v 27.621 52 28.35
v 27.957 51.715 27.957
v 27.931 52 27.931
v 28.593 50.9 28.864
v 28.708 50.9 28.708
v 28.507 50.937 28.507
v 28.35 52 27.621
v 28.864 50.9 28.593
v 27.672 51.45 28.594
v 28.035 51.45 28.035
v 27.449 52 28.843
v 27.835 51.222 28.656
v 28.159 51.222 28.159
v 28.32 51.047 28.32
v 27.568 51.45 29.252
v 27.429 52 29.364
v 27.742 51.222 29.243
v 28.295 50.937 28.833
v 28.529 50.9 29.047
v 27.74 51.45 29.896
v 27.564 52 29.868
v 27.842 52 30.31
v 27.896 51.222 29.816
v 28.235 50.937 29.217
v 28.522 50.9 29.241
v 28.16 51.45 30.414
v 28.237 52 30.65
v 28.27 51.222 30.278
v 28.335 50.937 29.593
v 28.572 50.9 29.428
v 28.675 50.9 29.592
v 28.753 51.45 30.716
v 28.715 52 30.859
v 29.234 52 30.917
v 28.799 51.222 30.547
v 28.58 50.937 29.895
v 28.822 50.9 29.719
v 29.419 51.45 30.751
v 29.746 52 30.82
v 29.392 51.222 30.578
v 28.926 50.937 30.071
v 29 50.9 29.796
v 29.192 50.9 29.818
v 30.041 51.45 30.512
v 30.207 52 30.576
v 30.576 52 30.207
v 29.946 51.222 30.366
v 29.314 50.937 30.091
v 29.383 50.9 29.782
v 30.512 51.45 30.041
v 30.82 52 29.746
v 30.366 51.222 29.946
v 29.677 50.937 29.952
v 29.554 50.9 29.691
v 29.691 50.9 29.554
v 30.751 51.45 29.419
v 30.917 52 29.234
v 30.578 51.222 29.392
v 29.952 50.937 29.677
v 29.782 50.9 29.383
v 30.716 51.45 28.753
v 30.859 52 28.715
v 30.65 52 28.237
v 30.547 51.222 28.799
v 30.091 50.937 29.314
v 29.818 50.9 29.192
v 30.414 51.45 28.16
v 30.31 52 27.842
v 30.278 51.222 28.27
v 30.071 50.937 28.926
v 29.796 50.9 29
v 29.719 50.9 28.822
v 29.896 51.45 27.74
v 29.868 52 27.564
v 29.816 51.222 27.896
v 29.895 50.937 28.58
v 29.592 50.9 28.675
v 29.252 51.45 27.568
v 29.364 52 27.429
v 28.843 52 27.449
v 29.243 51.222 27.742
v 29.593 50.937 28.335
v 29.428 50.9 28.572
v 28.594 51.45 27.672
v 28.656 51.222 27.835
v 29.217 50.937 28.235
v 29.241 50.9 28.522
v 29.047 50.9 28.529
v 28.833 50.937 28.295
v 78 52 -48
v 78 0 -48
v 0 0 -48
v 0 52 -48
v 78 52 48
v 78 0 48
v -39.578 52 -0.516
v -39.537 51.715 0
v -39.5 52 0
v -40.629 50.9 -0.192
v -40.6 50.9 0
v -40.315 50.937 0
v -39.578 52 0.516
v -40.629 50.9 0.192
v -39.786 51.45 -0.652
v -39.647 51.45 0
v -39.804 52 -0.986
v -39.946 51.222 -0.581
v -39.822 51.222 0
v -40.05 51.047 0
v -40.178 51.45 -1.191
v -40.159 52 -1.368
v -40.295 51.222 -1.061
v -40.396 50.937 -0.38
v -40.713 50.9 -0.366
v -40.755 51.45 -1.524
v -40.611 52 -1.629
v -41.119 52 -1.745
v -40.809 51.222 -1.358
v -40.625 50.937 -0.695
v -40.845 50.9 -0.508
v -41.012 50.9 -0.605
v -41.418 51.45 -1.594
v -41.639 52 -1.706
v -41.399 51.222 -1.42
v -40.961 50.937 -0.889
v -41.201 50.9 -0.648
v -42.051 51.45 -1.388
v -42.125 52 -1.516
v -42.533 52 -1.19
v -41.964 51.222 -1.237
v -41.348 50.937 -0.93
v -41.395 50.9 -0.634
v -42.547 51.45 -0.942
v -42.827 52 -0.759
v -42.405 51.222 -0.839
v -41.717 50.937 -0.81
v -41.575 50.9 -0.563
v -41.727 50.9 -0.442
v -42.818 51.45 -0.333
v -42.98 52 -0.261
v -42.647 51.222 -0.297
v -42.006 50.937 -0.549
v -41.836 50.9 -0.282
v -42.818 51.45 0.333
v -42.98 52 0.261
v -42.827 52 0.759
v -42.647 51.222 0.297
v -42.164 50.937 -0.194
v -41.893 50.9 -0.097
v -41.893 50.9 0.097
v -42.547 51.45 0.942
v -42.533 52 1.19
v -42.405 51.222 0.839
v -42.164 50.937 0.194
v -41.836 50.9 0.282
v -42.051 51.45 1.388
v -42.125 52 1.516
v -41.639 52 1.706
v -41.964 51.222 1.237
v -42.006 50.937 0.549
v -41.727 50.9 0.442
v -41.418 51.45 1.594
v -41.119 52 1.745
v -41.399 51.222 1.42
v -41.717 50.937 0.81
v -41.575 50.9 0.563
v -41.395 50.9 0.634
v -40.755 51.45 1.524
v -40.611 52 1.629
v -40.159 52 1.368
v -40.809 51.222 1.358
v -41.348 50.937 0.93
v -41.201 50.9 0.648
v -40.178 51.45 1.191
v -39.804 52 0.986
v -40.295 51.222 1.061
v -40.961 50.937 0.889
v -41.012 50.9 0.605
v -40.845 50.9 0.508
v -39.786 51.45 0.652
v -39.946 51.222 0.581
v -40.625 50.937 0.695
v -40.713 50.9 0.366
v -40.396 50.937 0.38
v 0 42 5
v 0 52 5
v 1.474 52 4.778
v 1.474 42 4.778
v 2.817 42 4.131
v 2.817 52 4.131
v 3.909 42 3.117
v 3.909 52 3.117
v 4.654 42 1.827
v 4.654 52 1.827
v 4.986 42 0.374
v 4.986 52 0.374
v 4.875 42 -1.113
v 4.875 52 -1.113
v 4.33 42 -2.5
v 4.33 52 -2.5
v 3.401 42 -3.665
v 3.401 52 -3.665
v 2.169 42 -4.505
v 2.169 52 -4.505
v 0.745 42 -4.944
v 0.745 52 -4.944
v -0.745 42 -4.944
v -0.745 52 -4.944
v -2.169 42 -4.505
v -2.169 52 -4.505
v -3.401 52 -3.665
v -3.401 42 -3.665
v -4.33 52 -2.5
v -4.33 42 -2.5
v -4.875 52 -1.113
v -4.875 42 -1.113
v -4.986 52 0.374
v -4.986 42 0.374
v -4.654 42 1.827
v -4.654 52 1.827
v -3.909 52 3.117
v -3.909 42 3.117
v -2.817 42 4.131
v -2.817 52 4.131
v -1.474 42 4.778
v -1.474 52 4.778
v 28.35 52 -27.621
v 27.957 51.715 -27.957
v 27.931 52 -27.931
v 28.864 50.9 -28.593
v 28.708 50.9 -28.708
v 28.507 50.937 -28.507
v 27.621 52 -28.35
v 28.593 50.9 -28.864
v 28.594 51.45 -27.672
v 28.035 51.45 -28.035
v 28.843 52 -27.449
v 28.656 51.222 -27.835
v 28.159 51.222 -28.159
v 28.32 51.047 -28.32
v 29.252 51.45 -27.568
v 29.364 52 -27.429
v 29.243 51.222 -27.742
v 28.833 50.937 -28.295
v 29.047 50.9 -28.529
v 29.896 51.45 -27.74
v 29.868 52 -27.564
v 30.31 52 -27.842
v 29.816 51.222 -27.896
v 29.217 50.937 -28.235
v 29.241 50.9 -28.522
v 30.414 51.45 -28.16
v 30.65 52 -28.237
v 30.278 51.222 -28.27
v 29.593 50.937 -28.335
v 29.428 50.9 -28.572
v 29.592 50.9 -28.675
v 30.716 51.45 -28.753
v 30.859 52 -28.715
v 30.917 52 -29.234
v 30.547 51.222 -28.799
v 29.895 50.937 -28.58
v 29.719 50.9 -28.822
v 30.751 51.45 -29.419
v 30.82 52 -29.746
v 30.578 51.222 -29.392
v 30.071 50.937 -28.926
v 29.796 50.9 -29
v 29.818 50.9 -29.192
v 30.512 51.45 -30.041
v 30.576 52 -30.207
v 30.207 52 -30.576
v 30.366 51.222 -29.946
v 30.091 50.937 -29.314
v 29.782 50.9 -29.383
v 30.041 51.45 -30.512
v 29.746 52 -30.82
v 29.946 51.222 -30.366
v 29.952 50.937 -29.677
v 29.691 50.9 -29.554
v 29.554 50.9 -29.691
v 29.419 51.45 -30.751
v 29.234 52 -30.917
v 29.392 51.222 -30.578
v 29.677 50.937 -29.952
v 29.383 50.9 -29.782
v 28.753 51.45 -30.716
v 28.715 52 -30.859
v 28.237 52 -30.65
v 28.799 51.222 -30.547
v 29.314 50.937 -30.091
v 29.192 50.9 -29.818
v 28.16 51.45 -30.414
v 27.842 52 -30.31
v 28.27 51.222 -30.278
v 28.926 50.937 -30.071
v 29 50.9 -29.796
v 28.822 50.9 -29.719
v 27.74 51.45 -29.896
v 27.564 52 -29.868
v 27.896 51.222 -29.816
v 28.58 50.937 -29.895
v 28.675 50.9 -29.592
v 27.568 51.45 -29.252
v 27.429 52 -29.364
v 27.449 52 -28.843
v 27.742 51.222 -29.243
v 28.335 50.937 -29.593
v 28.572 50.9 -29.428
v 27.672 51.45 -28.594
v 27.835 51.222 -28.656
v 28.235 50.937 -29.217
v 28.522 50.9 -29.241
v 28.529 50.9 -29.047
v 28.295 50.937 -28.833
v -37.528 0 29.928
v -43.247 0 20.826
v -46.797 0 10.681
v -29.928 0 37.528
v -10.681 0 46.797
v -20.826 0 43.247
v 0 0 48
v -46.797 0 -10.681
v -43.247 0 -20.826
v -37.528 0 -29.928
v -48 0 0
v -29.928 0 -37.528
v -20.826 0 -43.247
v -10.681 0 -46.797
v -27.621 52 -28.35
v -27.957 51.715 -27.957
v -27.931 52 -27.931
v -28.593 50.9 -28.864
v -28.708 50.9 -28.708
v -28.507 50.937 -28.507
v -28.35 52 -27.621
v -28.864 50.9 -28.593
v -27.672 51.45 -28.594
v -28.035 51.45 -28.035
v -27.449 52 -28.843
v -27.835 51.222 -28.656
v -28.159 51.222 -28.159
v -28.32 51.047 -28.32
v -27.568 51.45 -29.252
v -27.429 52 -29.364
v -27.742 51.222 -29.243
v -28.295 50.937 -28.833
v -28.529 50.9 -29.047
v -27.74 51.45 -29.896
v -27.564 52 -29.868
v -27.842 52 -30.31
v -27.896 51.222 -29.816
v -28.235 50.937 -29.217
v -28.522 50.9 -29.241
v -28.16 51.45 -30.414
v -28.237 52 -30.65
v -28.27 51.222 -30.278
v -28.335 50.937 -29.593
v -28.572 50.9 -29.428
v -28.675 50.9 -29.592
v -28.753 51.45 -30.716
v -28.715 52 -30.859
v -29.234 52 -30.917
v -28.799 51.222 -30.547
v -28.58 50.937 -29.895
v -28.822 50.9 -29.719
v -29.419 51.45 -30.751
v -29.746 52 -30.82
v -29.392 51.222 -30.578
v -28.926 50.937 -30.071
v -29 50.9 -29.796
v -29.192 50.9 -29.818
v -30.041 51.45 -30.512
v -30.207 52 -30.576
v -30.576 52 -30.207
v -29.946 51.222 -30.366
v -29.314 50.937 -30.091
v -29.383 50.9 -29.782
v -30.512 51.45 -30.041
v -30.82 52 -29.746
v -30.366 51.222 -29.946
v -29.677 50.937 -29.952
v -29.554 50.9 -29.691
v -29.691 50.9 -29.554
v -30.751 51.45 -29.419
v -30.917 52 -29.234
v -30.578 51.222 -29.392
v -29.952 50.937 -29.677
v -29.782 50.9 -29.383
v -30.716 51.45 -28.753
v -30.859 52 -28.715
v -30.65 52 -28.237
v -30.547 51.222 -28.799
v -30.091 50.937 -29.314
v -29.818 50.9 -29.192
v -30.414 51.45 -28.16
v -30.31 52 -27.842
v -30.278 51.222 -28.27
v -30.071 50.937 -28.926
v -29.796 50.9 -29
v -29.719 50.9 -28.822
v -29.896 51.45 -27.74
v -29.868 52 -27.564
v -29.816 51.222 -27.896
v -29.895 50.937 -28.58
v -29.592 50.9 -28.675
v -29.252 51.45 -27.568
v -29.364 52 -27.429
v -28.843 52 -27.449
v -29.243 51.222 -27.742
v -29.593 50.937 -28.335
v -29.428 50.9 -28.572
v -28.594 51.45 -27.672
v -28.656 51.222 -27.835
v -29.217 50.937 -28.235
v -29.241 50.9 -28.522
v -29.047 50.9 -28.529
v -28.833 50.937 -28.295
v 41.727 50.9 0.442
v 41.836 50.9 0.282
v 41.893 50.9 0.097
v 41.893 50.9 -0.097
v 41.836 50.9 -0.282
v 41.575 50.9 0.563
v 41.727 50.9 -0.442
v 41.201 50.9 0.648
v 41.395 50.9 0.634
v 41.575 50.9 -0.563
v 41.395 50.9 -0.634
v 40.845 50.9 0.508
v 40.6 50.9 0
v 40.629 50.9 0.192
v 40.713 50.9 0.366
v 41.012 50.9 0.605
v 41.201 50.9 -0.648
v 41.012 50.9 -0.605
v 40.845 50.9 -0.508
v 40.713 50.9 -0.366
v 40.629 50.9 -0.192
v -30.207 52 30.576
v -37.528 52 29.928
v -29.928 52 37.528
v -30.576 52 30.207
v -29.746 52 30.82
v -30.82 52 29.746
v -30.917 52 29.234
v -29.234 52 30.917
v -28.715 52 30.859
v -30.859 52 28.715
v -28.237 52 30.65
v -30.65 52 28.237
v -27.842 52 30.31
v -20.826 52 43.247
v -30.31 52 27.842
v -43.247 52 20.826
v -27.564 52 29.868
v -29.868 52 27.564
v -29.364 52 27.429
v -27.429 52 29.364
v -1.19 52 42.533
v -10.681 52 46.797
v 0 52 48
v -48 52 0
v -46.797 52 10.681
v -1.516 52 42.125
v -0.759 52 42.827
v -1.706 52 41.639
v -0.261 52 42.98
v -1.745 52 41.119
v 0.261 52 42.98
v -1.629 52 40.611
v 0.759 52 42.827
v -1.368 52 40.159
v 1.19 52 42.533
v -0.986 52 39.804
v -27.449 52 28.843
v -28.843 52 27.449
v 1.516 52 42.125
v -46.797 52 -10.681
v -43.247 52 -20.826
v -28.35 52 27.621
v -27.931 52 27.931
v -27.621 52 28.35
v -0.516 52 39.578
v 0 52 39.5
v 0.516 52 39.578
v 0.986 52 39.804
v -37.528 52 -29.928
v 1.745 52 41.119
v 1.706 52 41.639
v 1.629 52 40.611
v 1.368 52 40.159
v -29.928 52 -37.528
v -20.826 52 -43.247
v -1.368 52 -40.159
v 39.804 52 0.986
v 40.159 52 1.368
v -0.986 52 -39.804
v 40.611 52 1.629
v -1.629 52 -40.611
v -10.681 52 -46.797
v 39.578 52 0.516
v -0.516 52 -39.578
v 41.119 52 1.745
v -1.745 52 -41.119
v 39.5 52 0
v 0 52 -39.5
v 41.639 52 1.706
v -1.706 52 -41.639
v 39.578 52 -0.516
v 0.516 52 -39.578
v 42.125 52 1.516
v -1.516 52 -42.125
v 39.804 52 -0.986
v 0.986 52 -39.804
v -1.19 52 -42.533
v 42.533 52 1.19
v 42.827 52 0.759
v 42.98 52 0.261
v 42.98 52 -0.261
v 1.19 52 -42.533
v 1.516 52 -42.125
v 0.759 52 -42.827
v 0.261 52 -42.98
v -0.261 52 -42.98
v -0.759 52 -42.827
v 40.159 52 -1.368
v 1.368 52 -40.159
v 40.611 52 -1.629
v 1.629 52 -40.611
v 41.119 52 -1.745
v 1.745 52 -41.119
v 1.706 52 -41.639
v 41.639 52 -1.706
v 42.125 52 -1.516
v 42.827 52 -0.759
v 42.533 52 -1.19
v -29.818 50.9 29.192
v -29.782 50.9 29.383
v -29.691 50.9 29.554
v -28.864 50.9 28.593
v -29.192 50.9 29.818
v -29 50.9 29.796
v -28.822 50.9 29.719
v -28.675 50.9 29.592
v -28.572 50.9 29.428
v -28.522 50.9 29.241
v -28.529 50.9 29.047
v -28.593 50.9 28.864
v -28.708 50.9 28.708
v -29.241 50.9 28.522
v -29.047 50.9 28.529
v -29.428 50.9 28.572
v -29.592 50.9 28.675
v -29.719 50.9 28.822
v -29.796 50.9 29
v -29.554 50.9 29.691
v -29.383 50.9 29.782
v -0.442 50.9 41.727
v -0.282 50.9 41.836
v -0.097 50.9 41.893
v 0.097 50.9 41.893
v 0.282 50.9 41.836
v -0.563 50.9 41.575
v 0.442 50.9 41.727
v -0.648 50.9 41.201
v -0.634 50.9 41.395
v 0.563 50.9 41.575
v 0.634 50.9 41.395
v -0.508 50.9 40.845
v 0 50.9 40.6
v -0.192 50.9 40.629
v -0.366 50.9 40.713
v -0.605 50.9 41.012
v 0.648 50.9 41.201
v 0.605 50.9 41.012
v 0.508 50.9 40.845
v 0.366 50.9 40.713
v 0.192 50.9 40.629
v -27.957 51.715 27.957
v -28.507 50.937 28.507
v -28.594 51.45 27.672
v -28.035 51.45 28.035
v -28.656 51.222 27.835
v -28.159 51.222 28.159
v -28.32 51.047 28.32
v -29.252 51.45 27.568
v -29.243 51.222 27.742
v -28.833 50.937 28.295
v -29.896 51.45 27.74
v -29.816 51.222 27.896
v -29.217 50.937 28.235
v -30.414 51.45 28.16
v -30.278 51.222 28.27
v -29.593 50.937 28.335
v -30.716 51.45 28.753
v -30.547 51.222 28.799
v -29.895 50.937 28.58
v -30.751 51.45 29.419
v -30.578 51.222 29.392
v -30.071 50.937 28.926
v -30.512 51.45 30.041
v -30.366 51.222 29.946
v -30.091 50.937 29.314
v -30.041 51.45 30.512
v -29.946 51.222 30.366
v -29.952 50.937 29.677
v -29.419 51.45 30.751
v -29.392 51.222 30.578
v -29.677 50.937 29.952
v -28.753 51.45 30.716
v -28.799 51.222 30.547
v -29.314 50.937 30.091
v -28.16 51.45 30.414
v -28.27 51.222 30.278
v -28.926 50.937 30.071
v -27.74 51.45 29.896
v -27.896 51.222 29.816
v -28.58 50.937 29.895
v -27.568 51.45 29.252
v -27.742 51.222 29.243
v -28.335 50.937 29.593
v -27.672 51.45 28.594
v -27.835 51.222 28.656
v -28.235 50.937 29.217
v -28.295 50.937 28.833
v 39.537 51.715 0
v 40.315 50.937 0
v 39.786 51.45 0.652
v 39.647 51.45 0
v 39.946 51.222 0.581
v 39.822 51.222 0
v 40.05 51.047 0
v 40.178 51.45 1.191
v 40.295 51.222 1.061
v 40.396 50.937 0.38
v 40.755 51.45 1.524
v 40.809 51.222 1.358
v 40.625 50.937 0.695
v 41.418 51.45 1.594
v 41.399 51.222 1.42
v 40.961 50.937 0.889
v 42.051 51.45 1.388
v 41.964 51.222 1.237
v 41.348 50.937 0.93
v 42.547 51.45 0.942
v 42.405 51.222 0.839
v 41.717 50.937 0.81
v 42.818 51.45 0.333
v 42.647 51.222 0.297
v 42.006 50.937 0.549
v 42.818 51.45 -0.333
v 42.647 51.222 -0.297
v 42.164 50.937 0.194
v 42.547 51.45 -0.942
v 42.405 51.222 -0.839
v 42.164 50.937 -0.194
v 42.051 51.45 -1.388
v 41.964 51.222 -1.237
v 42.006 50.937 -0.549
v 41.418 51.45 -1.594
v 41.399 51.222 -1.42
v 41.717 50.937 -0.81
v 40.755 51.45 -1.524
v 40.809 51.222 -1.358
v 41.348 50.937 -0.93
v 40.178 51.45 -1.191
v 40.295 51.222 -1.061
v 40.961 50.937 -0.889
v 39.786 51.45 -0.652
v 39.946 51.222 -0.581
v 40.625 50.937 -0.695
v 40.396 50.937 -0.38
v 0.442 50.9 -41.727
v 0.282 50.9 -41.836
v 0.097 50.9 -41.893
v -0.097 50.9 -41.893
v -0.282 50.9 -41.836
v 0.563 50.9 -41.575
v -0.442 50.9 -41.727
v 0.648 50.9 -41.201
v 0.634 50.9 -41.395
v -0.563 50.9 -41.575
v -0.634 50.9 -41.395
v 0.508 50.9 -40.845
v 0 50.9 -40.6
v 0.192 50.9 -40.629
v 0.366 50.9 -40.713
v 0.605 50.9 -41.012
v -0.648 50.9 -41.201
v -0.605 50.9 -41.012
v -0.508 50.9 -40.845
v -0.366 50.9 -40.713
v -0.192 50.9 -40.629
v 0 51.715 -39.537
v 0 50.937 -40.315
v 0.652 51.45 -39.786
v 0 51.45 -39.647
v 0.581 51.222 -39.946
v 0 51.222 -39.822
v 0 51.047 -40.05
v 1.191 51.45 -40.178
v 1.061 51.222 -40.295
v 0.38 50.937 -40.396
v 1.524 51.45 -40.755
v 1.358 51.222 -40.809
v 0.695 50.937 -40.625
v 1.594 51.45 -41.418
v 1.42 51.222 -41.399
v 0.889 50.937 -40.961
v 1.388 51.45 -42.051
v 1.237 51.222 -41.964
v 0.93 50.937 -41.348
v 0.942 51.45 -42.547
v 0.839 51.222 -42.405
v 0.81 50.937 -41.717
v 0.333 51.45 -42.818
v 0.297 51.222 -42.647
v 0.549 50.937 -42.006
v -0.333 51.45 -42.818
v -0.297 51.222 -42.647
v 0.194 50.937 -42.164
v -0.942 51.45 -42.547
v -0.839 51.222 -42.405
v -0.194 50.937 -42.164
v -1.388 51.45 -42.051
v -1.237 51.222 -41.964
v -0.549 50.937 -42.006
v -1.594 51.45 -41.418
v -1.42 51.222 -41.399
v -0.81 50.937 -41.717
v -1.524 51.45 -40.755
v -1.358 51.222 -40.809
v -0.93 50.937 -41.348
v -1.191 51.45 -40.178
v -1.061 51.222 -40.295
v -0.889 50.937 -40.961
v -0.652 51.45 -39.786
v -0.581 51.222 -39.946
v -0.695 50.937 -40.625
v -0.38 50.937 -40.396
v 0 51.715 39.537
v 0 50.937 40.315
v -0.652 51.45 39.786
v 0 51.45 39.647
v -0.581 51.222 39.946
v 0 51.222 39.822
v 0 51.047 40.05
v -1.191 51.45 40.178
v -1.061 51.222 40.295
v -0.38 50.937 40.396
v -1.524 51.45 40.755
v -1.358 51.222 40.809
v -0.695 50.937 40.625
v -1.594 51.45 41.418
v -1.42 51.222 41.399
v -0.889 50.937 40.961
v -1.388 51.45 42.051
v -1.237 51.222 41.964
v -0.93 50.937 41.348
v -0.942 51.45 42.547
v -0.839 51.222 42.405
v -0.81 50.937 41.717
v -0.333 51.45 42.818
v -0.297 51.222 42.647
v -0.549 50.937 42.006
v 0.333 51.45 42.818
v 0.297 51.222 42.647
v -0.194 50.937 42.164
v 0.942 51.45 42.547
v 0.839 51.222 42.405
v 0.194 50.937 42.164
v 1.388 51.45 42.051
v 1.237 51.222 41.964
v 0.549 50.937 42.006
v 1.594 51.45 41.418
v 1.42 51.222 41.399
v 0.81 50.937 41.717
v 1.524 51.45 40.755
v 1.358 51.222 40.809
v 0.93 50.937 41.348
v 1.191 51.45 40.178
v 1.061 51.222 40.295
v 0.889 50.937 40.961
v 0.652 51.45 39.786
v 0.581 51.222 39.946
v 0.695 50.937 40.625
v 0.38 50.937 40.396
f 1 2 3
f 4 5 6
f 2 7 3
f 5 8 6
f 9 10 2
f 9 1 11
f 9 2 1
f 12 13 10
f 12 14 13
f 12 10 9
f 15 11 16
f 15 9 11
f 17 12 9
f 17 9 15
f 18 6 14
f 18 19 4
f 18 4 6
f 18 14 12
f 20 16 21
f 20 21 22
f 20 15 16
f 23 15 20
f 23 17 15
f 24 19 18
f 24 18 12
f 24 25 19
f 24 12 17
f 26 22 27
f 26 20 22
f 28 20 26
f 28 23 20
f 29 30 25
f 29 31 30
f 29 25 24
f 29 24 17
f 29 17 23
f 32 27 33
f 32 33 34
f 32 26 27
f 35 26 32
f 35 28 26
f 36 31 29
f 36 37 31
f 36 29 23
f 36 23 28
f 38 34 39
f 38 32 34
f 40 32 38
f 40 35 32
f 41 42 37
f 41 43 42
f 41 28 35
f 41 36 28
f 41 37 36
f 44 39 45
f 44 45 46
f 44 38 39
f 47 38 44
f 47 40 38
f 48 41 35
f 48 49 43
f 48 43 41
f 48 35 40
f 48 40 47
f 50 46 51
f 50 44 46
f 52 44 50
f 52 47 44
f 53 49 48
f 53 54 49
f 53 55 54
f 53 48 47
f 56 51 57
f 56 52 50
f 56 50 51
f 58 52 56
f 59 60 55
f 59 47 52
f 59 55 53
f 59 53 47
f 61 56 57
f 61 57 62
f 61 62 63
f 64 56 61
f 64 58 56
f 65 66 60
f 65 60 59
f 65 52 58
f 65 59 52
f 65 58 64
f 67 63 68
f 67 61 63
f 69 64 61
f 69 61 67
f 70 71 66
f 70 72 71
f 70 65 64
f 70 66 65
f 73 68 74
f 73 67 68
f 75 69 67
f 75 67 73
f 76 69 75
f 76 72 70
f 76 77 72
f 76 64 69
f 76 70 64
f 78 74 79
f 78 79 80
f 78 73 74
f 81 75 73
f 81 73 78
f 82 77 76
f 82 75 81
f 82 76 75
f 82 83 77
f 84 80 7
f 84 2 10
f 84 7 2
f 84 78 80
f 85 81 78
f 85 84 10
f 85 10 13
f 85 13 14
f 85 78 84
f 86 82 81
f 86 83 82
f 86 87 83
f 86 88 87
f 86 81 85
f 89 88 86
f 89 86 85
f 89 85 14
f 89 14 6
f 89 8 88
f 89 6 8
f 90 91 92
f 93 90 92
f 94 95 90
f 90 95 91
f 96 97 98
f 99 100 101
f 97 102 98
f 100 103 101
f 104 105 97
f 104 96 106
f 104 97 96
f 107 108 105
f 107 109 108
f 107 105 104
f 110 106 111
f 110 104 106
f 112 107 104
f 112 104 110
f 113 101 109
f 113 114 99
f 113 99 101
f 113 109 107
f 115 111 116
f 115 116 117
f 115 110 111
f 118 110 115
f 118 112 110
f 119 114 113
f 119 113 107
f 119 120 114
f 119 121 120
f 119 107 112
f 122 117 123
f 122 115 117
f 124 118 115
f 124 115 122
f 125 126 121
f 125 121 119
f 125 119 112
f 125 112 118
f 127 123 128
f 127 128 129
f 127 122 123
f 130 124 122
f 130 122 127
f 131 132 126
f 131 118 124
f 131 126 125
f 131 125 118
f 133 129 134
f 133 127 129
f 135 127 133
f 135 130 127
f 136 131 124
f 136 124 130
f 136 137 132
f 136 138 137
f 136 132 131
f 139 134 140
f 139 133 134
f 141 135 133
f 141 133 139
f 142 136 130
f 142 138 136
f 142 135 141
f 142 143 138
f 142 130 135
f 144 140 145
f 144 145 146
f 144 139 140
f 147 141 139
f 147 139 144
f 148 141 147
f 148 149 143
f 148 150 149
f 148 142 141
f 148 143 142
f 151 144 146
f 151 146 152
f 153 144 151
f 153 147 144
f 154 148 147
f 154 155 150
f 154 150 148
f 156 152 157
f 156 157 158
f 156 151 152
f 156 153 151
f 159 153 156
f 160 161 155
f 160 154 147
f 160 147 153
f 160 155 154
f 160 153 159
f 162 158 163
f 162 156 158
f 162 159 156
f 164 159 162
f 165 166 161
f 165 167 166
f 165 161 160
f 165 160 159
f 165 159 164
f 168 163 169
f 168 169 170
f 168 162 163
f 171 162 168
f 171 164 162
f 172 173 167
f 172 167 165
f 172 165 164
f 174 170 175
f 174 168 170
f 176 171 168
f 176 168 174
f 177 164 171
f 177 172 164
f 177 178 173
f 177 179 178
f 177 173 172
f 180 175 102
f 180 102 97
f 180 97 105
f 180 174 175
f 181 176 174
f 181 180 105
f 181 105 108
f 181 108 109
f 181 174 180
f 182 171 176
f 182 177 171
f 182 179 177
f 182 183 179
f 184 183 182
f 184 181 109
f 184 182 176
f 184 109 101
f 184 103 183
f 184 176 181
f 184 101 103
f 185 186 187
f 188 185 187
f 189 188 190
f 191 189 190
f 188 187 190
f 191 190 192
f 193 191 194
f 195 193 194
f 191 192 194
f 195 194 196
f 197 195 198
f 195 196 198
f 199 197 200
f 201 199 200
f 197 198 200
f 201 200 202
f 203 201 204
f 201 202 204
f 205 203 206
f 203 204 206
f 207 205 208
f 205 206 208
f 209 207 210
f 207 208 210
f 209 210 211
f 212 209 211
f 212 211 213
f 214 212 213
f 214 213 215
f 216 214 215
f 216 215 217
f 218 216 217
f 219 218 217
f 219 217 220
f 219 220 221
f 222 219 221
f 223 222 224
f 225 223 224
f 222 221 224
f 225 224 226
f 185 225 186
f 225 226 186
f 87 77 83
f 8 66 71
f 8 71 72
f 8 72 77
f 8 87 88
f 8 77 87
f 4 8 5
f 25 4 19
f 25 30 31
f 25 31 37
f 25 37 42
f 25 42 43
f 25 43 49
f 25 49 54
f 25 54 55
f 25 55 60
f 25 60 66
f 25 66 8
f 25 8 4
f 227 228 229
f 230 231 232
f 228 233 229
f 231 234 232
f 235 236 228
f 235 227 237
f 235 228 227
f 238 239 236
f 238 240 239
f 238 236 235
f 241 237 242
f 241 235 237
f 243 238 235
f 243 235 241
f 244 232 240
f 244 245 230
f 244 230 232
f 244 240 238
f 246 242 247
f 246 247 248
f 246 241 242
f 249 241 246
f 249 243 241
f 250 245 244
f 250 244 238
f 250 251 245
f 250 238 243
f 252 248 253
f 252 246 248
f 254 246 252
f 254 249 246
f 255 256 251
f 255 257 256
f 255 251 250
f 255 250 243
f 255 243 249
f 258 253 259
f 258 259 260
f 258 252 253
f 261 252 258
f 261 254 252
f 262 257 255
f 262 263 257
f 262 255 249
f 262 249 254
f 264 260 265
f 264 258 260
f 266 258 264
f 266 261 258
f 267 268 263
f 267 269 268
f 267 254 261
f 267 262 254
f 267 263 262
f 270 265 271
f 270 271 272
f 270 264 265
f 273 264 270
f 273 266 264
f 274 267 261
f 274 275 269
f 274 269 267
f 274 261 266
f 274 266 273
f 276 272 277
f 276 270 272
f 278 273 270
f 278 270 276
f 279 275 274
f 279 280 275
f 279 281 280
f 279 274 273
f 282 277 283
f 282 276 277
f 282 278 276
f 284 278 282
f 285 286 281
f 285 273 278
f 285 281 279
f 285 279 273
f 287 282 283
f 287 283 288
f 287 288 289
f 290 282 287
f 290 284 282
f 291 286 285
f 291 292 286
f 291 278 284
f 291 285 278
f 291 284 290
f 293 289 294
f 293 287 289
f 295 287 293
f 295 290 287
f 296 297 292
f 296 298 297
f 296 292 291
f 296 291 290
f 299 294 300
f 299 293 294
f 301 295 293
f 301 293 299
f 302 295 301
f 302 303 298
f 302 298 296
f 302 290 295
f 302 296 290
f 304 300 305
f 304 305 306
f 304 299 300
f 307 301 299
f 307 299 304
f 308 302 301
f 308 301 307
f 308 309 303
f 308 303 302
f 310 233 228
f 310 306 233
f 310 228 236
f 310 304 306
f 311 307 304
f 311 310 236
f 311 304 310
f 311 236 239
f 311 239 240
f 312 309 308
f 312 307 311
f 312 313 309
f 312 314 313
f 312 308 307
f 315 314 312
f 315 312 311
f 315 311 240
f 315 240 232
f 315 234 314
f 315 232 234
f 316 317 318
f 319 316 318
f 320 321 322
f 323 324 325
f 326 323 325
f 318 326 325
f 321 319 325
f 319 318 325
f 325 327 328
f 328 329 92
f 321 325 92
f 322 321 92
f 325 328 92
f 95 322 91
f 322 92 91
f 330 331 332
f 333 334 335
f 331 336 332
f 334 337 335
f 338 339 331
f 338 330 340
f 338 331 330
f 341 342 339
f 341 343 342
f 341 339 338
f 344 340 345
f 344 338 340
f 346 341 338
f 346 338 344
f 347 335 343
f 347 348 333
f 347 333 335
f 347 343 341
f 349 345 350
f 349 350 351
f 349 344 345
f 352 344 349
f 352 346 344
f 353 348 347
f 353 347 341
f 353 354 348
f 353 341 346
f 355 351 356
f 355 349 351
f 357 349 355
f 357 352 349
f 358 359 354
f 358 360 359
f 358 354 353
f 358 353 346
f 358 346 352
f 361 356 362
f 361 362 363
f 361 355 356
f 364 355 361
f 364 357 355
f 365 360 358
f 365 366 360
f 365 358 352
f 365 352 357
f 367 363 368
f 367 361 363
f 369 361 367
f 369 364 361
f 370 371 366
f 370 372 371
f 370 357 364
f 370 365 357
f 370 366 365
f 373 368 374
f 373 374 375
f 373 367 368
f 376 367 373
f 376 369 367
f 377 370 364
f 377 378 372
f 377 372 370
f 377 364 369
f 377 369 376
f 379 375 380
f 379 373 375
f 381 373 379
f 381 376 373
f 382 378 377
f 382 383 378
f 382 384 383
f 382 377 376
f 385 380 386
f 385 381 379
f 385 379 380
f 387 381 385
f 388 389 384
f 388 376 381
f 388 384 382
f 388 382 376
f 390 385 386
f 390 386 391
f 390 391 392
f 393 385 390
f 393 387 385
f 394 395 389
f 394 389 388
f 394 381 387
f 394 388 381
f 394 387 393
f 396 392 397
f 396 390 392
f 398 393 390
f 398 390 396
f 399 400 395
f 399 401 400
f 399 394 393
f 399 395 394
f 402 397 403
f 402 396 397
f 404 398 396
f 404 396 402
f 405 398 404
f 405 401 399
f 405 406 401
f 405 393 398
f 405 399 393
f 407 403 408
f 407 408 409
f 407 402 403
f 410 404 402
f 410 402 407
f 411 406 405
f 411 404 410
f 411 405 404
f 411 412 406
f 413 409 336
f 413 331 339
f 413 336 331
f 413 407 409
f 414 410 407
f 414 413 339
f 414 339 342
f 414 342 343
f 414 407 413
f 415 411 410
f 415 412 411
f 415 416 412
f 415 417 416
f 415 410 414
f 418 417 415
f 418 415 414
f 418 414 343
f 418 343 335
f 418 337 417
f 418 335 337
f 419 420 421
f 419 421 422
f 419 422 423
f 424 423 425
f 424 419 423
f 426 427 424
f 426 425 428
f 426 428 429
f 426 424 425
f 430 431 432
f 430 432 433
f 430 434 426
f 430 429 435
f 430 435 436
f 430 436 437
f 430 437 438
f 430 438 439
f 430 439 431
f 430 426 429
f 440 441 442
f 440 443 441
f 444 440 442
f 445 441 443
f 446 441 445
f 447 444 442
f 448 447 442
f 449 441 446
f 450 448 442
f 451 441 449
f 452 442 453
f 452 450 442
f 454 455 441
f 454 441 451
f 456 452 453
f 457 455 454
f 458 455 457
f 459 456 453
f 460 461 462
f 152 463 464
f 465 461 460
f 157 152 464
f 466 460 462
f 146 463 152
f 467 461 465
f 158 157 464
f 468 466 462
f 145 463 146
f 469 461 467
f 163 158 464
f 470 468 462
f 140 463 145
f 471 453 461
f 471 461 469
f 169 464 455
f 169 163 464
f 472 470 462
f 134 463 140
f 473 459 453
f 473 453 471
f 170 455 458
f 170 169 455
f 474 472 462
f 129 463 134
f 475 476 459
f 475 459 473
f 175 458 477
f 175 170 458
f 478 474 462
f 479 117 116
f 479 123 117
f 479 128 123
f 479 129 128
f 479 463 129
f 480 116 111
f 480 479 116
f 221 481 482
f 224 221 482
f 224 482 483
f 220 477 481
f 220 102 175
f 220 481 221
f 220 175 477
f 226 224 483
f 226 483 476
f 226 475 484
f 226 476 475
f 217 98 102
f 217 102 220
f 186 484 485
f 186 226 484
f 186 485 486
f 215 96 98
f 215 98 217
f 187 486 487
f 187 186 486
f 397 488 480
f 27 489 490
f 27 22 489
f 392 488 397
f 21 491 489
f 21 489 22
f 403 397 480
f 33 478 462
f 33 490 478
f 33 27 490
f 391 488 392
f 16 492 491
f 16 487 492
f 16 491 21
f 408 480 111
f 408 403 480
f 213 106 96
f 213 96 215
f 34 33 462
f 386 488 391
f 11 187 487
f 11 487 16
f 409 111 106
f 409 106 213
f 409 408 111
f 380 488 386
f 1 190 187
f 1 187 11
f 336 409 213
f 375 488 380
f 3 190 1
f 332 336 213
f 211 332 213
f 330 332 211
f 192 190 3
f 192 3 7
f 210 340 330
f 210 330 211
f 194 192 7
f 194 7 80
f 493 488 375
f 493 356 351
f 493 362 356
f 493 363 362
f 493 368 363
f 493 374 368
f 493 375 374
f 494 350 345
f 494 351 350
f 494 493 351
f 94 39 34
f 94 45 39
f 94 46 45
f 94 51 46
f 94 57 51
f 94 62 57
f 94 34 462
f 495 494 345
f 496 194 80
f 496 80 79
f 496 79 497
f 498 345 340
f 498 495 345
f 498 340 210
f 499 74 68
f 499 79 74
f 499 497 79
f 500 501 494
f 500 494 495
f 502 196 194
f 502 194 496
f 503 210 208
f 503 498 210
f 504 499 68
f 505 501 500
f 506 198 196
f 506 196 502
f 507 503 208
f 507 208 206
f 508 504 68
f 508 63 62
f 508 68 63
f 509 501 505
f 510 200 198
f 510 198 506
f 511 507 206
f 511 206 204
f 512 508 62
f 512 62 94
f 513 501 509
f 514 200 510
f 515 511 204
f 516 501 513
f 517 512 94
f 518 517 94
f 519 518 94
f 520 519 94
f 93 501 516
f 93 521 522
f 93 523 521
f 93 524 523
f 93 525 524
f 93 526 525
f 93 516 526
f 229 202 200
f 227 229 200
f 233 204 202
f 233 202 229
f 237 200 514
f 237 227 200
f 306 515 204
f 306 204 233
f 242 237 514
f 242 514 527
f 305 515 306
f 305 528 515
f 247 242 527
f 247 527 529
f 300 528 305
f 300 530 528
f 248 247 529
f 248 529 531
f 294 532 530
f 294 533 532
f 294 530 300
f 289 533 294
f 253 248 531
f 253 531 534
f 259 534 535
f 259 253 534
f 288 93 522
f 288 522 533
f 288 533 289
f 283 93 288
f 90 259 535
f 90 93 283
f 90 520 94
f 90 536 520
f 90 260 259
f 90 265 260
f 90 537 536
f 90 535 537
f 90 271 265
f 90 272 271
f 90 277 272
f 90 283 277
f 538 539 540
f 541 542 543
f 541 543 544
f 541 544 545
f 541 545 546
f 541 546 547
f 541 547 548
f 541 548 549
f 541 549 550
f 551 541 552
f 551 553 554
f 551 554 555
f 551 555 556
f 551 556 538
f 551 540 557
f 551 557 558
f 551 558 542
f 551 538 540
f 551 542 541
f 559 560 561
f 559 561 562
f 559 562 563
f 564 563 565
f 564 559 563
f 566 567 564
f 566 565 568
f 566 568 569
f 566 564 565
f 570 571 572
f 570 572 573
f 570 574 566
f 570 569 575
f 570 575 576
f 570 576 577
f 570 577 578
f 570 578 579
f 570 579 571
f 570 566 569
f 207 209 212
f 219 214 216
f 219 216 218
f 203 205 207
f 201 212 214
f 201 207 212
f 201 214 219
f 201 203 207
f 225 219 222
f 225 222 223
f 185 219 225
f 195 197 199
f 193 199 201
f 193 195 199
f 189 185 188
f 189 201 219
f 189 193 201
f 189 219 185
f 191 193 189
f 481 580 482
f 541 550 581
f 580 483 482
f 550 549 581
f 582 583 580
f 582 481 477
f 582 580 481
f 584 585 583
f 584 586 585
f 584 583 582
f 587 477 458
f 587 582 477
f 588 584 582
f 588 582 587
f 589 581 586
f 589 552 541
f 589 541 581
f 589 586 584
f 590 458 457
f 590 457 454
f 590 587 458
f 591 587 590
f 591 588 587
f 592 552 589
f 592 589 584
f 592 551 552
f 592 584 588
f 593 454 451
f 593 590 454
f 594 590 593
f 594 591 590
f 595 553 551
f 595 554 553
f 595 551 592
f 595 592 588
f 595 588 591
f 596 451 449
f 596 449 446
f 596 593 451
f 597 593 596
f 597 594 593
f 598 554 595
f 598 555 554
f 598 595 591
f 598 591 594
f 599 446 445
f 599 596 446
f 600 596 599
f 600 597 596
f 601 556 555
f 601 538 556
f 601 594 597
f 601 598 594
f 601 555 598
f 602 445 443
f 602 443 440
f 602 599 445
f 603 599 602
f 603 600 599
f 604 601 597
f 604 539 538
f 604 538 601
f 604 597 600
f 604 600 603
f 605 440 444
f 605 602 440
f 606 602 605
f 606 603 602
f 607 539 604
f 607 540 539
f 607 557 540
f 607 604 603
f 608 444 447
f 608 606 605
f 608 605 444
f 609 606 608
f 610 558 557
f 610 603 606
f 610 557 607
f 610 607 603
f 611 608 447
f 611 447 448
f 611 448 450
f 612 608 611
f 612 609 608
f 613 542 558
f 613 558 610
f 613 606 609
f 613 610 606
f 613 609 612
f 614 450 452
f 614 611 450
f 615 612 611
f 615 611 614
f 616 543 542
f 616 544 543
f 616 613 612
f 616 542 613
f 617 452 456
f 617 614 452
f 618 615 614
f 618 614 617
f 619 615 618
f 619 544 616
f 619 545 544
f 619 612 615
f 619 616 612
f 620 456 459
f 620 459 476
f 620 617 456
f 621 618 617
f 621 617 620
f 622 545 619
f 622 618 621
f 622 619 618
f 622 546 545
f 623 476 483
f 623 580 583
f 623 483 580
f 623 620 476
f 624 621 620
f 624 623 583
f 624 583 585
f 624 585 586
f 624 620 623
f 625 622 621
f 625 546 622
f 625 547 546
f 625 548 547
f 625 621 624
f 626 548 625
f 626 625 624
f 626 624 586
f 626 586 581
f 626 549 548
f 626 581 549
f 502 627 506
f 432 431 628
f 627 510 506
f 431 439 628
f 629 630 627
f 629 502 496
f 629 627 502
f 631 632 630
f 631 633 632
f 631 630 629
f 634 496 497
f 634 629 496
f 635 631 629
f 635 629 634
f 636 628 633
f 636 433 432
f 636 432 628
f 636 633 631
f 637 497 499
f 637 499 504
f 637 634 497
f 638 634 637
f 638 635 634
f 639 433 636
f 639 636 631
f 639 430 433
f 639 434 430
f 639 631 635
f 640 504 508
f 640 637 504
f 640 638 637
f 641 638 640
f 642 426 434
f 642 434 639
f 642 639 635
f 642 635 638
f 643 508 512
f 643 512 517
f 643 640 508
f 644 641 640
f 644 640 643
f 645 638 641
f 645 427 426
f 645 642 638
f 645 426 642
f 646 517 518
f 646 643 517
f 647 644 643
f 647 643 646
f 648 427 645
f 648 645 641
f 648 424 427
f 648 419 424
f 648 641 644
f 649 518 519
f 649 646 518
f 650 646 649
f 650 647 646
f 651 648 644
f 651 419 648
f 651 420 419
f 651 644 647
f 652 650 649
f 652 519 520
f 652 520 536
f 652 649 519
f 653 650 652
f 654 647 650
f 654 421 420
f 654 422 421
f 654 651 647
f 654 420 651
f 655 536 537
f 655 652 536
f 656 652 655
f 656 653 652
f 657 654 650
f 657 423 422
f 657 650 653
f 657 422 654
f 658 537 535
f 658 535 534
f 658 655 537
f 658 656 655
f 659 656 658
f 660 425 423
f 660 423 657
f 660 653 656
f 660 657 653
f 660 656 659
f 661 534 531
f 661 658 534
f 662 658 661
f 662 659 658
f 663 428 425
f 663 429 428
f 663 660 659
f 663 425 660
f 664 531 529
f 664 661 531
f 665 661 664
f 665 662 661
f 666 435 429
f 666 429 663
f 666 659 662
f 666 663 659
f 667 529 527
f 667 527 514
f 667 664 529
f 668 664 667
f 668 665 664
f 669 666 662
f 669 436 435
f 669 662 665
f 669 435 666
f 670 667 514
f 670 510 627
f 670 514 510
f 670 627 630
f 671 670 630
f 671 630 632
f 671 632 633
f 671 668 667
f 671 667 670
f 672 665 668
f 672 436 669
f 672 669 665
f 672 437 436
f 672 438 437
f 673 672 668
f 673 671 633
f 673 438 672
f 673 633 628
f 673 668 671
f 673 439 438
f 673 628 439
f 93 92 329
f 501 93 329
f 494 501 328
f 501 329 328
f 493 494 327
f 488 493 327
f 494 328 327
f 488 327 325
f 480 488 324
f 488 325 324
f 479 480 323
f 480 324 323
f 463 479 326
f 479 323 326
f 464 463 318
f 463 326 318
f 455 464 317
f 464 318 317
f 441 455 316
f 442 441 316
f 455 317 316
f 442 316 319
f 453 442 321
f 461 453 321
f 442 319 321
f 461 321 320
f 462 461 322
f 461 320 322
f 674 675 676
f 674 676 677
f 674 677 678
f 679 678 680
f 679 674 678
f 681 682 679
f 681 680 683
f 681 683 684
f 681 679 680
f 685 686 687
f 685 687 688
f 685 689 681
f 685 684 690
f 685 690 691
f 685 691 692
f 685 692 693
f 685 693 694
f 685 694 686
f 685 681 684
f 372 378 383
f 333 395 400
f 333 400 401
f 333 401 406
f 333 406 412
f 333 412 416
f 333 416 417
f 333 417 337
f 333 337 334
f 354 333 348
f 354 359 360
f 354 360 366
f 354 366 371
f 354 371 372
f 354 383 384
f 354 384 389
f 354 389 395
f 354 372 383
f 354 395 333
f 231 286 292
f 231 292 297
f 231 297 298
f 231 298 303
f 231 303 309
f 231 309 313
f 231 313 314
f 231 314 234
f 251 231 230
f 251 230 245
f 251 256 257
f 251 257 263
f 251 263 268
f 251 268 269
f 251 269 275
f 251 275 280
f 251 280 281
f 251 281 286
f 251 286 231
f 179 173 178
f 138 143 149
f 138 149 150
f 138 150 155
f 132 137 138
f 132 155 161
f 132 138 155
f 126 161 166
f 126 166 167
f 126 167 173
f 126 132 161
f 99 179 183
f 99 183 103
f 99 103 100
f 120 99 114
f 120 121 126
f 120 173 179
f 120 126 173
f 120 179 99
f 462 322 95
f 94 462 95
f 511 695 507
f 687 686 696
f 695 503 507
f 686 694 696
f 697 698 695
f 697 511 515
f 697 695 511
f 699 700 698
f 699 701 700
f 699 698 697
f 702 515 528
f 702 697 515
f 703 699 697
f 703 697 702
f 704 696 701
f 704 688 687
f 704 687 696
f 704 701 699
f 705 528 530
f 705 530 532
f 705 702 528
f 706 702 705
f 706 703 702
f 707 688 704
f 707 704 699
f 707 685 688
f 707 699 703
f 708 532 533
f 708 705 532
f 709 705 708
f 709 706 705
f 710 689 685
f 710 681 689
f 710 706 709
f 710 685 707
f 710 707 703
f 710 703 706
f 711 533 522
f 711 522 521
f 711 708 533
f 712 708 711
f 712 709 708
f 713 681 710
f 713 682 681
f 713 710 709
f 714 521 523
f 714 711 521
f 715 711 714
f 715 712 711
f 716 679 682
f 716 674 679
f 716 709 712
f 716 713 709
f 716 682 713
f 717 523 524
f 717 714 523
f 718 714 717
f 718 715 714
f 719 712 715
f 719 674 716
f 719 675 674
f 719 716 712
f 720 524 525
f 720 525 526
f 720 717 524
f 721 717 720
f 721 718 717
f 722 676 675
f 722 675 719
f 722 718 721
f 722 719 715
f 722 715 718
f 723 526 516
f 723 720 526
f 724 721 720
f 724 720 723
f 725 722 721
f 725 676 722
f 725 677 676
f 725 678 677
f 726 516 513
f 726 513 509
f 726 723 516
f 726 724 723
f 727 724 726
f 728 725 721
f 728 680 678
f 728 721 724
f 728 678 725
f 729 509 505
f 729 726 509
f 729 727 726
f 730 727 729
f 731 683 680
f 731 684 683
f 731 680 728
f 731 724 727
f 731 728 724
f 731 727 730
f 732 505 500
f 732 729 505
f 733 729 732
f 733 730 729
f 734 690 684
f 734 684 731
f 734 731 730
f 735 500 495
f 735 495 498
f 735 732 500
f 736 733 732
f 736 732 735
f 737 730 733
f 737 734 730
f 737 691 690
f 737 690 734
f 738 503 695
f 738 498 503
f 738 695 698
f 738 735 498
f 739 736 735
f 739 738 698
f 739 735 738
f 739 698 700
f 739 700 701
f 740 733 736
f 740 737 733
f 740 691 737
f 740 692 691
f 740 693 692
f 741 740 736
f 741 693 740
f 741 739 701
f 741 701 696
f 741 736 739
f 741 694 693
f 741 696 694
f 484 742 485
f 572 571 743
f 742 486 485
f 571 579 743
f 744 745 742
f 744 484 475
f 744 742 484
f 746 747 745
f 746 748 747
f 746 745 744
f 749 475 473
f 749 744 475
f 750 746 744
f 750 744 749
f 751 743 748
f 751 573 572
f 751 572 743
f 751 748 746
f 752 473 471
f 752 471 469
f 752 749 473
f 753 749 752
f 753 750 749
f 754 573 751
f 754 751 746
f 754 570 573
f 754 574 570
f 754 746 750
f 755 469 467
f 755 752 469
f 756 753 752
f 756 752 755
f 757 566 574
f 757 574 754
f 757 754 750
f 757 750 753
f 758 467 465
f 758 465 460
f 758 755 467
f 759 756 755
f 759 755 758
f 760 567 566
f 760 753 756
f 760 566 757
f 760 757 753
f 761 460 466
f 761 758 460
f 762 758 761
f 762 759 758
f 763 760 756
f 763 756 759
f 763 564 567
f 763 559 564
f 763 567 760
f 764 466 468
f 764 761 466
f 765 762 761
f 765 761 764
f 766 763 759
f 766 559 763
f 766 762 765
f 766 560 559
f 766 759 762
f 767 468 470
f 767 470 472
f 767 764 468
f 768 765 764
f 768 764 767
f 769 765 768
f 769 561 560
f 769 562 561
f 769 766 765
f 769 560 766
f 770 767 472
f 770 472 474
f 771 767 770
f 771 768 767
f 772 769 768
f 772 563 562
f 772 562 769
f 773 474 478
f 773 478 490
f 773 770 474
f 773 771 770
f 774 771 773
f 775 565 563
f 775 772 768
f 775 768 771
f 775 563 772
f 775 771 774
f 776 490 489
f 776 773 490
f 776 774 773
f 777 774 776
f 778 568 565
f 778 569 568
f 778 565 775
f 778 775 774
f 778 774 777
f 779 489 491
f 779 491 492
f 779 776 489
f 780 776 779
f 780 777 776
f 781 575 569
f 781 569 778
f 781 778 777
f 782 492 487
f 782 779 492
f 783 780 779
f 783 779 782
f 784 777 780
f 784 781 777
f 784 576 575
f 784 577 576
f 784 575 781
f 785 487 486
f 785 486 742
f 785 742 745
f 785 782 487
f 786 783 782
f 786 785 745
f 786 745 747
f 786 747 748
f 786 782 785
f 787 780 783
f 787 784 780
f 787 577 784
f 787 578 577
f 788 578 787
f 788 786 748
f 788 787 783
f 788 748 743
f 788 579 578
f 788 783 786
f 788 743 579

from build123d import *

# Parameters (mm, degrees)
SALIENTE_EXTRUIR1_DEPTH = 52
CROQUIS2_R              = 1.75
CORTAR_EXTRUIR1_DEPTH   = 1.1
REDONDEO1_R             = 1.1
MATRIZC3_COUNT          = 8
REDONDEO1_OF_MATRIZC3_R = 1.1
CROQUIS3_R              = 5
CORTAR_EXTRUIR2_DEPTH   = 10


with BuildPart() as part:
    # Croquis1 → Saliente-Extruir1 (new body)
    with BuildSketch(Plane(origin=(0, 0, 0), x_dir=(1, 0, 0), z_dir=(0, 1, 0))):
        with BuildLine():
            ThreePointArc((0, 48), (-48, 0), (0, -48))
            Line((0, -48), (0, 48))
        make_face()
        with BuildLine():
            Line((0, 48), (0, -48))
            ThreePointArc((0, -48), (33.941125497, -33.941125497), (48, 0))
            ThreePointArc((48, 0), (33.941125497, 33.941125497), (0, 48))
        make_face()
        with BuildLine():
            Line((0, -48), (78, -48))
            Line((78, -48), (78, 48))
            Line((78, 48), (0, 48))
            ThreePointArc((0, 48), (33.941125497, 33.941125497), (48, 0))
            ThreePointArc((48, 0), (33.941125497, -33.941125497), (0, -48))
        make_face()
    extrude(amount=SALIENTE_EXTRUIR1_DEPTH)

    # Croquis2 → Cortar-Extruir1 (cut)
    with BuildSketch(Plane(origin=(0, 52, 0), x_dir=(1, 0, 0), z_dir=(0, 1, 0))):
        with Locations(Location((0, 41.25, 0), (0, 0, 270))):
            Circle(CROQUIS2_R)
    cortar_extruir1 = extrude(amount=-CORTAR_EXTRUIR1_DEPTH, mode=Mode.SUBTRACT)

    # Redondeo1
    redondeo1_edges = [part.edges().sort_by_distance(p)[0] for p in [
        (0, 50.9, -43),
    ]]
    fillet(redondeo1_edges, radius=REDONDEO1_R - 0.0001)  # a hair under: the kernel refuses the full size

    # MatrizC3: Cortar-Extruir1 ×8 about axis
    matrizc3_axis = Axis((0, 0, 0), (0, 1, 0))
    for i in range(1, MATRIZC3_COUNT):
        add(cortar_extruir1.rotate(matrizc3_axis, i * 360 / MATRIZC3_COUNT), mode=Mode.SUBTRACT)

    # Redondeo1 of MatrizC3
    redondeo1_of_matrizc3_edges = [part.edges().sort_by_distance(p)[0] for p in [
        (-30.405591591, 50.9, -30.405591591),
        (-43, 50.9, 0),
        (-30.405591591, 50.9, 30.405591591),
        (0, 50.9, 43),
        (30.405591591, 50.9, 30.405591591),
        (43, 50.9, 0),
        (30.405591591, 50.9, -30.405591591),
    ]]
    fillet(redondeo1_of_matrizc3_edges, radius=REDONDEO1_OF_MATRIZC3_R - 0.0001)  # a hair under: the kernel refuses the full size

    # Croquis3 → Cortar-Extruir2 (cut)
    with BuildSketch(Plane(origin=(0, 52, 0), x_dir=(1, 0, 0), z_dir=(0, 1, 0))):
        with Locations(Location((0, 0, 0), (0, 0, 270))):
            Circle(CROQUIS3_R)
    extrude(amount=-CORTAR_EXTRUIR2_DEPTH, mode=Mode.SUBTRACT)


solid = part.part
